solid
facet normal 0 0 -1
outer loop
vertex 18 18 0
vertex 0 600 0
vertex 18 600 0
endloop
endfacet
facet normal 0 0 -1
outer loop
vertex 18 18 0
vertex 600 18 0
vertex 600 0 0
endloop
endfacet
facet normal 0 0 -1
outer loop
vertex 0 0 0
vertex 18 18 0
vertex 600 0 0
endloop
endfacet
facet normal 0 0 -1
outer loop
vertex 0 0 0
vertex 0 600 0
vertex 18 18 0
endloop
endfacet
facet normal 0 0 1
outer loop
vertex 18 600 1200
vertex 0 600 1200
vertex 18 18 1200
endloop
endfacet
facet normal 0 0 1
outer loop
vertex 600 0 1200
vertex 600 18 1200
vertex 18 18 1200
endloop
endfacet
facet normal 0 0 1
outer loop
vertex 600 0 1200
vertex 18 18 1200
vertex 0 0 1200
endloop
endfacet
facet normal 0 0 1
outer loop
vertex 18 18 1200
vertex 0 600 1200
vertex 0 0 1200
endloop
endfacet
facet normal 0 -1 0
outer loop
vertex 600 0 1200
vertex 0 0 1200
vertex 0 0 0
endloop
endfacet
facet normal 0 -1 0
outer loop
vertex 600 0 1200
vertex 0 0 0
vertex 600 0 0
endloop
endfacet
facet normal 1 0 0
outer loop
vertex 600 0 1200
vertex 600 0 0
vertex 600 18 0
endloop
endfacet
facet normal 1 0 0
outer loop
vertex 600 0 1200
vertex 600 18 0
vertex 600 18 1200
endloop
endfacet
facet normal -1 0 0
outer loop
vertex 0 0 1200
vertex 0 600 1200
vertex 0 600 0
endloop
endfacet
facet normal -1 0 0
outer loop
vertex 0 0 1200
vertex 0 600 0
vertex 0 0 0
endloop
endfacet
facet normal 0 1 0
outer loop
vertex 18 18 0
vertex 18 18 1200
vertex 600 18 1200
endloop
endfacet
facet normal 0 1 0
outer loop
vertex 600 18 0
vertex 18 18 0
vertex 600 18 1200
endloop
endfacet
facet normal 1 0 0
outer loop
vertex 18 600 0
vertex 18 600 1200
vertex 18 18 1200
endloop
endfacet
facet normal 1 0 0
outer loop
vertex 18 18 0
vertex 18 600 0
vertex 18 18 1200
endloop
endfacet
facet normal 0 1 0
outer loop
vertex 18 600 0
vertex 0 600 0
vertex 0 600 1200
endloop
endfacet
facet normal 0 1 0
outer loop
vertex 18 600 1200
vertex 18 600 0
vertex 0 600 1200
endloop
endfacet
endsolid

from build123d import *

# Parameters (mm, degrees)
F0_W     = 600
F0_H     = 1200
F1_DEPTH = 18
F2_W     = 582
F2_H     = 1200
F3_DEPTH = 18


with BuildPart() as f1:
    # F0 (on Front) → F1 (new body)
    with BuildSketch(Plane.XZ):
        with Locations((300, 600)):
            Rectangle(F0_W, F0_H)
    extrude(amount=-F1_DEPTH)

    # F2 (on face) → F3 (join)
    with BuildSketch(Plane(origin=(0, 0, 0), x_dir=(0, -1, 0), z_dir=(-1, 0, 0))):
        with Locations((-309, 600)):
            Rectangle(F2_W, F2_H)
    extrude(amount=-F3_DEPTH)


solid = f1.part
